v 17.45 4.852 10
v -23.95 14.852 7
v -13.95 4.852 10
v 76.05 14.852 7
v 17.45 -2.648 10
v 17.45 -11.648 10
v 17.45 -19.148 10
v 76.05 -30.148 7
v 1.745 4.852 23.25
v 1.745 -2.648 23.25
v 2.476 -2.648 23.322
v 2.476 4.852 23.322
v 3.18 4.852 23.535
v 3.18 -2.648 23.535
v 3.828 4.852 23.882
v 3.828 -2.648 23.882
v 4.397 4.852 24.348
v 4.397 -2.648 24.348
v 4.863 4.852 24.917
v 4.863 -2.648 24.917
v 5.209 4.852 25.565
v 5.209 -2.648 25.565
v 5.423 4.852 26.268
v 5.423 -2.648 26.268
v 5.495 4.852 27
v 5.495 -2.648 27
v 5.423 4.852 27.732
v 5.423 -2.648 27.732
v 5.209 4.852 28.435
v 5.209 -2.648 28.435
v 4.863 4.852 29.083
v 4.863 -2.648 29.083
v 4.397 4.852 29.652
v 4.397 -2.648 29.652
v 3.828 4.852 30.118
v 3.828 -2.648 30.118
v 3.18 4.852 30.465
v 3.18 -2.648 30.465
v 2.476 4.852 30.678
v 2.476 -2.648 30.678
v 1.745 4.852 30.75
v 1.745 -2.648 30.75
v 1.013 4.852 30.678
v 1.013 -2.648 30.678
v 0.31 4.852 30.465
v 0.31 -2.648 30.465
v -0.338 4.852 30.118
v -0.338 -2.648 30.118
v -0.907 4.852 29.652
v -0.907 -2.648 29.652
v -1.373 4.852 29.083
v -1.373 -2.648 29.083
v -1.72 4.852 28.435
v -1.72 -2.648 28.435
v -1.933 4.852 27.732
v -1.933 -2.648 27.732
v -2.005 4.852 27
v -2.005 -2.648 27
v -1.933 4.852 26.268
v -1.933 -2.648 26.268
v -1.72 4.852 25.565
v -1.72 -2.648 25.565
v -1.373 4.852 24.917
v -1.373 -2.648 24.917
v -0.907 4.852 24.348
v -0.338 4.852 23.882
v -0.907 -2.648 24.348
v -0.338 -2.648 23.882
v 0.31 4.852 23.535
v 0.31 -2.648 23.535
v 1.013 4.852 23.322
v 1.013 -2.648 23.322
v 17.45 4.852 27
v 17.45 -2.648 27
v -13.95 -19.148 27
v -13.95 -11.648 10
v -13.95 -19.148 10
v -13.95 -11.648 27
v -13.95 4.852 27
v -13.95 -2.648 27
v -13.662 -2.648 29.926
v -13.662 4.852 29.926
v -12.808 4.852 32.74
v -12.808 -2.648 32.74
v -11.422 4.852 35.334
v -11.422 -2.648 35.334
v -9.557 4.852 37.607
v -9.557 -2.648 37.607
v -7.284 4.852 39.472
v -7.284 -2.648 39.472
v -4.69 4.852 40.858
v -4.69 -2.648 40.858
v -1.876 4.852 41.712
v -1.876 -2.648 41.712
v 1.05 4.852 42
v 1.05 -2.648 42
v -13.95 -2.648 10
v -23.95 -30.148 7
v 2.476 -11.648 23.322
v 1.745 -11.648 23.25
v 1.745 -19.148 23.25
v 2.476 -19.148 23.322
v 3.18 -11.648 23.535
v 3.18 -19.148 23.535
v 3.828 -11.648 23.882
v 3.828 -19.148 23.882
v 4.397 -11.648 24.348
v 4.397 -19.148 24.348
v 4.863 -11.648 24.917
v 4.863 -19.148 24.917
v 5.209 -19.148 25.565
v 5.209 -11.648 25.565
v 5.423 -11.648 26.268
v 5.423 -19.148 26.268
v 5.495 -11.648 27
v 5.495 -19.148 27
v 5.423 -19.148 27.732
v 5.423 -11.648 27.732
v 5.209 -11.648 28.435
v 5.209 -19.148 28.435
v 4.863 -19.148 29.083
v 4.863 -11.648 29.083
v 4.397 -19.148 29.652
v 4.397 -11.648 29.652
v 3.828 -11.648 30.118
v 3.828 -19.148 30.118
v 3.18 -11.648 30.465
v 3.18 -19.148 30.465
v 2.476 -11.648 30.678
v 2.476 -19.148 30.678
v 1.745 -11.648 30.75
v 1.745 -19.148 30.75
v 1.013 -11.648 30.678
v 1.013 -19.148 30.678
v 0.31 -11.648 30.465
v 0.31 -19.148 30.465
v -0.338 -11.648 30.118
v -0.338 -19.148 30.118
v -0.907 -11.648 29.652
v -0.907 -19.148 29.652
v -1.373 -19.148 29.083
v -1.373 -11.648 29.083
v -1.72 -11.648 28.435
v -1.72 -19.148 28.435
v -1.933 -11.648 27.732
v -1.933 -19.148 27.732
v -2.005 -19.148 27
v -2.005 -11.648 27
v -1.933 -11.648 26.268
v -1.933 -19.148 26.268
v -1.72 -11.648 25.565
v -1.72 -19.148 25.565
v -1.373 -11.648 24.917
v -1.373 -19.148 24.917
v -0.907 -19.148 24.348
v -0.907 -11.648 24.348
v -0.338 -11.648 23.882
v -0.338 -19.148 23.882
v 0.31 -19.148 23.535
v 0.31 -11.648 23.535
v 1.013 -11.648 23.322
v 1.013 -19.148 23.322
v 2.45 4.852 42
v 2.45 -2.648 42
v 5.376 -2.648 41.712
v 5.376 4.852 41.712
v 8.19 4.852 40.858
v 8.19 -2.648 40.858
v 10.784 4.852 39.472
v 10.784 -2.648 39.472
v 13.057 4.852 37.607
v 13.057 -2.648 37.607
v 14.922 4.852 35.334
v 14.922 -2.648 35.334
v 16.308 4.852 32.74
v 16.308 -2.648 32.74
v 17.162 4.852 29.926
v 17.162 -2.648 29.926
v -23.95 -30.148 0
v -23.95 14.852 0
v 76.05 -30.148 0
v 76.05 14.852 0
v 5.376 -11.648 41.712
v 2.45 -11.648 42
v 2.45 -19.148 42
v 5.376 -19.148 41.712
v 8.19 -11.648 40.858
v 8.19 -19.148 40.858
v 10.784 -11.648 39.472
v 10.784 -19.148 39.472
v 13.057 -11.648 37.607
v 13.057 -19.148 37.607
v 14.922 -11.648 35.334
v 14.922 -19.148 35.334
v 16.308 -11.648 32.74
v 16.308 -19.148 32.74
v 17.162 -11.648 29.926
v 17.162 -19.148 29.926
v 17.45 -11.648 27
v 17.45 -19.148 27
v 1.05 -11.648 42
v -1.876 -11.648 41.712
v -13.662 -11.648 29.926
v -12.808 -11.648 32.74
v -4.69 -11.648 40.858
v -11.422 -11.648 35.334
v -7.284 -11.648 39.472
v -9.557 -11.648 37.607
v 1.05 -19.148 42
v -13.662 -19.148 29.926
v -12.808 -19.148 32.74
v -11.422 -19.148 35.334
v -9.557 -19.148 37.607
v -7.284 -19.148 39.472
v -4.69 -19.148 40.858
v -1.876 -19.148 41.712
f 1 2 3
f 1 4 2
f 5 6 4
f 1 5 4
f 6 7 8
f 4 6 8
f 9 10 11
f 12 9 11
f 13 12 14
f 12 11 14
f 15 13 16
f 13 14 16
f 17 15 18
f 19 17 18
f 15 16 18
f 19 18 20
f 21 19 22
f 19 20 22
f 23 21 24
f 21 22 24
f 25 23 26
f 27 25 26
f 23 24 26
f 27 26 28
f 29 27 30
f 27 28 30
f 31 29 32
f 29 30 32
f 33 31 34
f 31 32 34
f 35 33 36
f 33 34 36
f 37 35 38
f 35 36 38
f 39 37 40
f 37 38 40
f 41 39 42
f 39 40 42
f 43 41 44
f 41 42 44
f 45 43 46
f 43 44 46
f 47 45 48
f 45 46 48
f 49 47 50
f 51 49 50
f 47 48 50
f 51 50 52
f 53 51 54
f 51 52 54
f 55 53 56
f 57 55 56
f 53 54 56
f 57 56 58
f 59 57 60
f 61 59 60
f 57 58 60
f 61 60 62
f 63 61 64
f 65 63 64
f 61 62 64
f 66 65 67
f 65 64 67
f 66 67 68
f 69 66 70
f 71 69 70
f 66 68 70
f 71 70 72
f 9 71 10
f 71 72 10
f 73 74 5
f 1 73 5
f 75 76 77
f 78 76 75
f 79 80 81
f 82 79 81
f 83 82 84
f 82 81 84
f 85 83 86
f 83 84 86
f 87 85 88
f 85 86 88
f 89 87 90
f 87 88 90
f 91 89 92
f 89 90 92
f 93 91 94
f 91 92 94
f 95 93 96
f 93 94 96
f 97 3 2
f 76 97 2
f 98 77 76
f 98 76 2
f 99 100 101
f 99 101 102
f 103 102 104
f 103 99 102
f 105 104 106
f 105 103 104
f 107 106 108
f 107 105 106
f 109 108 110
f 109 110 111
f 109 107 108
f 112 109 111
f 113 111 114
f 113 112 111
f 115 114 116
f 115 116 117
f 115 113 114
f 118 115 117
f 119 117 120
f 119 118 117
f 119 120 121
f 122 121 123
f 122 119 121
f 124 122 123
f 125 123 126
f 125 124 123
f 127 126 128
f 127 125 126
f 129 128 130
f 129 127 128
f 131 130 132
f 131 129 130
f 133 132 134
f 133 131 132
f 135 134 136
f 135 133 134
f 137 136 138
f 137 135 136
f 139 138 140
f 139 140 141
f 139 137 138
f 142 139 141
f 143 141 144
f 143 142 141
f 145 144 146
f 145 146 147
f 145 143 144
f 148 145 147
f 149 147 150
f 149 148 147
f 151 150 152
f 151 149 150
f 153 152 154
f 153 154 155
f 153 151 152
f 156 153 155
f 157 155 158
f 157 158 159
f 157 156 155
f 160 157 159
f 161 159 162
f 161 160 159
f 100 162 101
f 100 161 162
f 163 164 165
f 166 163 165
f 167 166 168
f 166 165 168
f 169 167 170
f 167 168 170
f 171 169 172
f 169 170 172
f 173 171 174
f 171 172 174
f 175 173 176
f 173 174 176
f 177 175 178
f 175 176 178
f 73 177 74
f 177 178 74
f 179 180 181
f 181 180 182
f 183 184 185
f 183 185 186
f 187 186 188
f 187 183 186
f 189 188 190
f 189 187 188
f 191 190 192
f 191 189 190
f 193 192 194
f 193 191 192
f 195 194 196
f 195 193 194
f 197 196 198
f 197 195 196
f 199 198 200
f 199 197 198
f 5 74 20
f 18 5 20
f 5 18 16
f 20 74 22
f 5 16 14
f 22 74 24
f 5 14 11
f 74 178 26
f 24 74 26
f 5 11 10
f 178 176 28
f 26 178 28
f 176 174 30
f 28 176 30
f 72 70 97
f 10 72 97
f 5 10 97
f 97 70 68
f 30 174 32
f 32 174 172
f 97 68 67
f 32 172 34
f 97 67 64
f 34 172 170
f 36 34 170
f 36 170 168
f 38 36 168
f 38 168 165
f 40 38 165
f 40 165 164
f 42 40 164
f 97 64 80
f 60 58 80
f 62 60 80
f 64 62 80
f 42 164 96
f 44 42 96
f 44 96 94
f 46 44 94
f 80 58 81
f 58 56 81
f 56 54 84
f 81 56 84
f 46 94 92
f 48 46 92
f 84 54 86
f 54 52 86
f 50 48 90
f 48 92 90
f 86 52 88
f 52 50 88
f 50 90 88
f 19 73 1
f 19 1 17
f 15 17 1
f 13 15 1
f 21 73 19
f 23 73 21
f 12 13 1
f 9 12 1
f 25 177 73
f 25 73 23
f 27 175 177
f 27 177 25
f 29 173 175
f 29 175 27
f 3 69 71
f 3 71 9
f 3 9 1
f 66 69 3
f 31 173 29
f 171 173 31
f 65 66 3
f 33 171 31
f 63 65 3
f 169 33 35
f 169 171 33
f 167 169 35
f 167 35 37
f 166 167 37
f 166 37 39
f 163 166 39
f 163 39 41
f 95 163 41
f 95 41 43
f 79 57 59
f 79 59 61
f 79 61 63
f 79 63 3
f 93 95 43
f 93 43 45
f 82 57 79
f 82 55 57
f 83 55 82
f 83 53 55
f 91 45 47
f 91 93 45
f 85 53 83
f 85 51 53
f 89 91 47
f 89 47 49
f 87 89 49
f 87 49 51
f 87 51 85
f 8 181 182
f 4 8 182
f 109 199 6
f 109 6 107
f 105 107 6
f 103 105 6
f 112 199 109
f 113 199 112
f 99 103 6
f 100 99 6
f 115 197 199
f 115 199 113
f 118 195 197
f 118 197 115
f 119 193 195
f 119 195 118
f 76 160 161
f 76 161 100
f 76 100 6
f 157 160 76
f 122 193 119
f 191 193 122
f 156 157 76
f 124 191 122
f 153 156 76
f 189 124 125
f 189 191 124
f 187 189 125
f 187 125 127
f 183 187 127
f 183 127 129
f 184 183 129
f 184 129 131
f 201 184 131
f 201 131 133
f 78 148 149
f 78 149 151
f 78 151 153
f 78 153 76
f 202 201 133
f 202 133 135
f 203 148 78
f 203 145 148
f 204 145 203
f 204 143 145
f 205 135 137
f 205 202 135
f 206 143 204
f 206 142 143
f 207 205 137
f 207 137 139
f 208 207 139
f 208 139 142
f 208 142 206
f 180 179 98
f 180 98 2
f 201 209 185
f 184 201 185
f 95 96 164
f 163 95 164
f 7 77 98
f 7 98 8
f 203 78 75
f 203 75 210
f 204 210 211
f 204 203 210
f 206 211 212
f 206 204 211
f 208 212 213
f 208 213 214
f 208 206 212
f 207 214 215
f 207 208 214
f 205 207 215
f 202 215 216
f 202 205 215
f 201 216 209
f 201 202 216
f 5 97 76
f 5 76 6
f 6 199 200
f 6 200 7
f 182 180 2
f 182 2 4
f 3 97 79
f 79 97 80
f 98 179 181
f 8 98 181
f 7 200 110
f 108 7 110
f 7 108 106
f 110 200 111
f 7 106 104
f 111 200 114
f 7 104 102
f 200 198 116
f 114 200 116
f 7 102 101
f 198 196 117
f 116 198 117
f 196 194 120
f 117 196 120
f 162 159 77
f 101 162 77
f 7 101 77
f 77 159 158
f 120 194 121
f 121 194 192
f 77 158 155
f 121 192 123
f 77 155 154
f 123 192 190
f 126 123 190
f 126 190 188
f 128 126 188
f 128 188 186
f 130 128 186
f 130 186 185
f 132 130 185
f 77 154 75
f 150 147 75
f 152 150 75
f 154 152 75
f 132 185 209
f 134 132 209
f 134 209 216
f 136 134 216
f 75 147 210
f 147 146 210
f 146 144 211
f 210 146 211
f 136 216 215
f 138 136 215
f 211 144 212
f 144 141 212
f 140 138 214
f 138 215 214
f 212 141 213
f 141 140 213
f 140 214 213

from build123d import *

# Parameters (mm, degrees)
SKETCH1_W           = 100
SKETCH1_H           = 45
BOSS_EXTRUDE1_DEPTH = 10
SKETCH3_W           = 31.4
SKETCH3_H           = 7.5
BOSS_EXTRUDE2_DEPTH = 5
SKETCH4_R           = 3.75
BOSS_EXTRUDE3_DEPTH = 7.5
CUT_EXTRUDE1_DEPTH  = 45
CUT_EXTRUDE2_DEPTH  = 100


with BuildPart() as part:
    # Sketch1 → Boss-Extrude1 (new body)
    with BuildSketch(Plane.XY):
        with Locations((26.050004349, -7.647768163)):
            Rectangle(SKETCH1_W, SKETCH1_H)
    extrude(amount=BOSS_EXTRUDE1_DEPTH)

    # Sketch3 → Boss-Extrude2 (add)
    with BuildSketch(Plane.XY.offset(10)):
        with Locations((1.750004349, 1.102231837)):
            Rectangle(SKETCH3_W, SKETCH3_H)
    boss_extrude2 = extrude(amount=BOSS_EXTRUDE2_DEPTH)

    # Sketch4 → Boss-Extrude3 (add)
    with BuildSketch(Plane.XZ.offset(2.647768163)):
        with BuildLine():
            Line((-13.949995651, 15), (-13.949995651, 27))
            ThreePointArc((-13.949995651, 27), (-9.556597369, 37.606601718), (1.050004349, 42))
            Line((1.050004349, 42), (2.450004349, 42))
            ThreePointArc((2.450004349, 42), (13.056606067, 37.606601718), (17.450004349, 27))
            Line((17.450004349, 27), (17.450004349, 15))
            Line((17.450004349, 15), (-13.949995651, 15))
        make_face()
        with Locations(Location((1.744890168, 27, 0), (0, 0, 270))):
            Circle(SKETCH4_R, mode=Mode.SUBTRACT)
    boss_extrude3 = extrude(amount=-BOSS_EXTRUDE3_DEPTH)

    # Mirror1: Boss-Extrude2, Boss-Extrude3 across plane
    add(boss_extrude2.mirror(Plane(origin=(0, -7.147768163, 0), x_dir=(0, 0, 1), z_dir=(0, -1, 0))))
    add(boss_extrude3.mirror(Plane(origin=(0, -7.147768163, 0), x_dir=(0, 0, 1), z_dir=(0, -1, 0))))

    # Sketch5 → Cut-Extrude1 (cut)
    with BuildSketch(Plane.XZ.offset(30.147768163)):
        Polygon((-13.949995651, 10), (-23.949995651, 7), (-23.949995651, 10), align=None)
        Polygon((17.450004349, 10), (76.050004349, 7), (76.050004349, 10), align=None)
    extrude(amount=-CUT_EXTRUDE1_DEPTH, mode=Mode.SUBTRACT)

    # Sketch6 → Cut-Extrude2 (cut)
    with BuildSketch(Plane.ZY.offset(23.949995651)):
        Polygon((7, 14.852231837), (10, 4.852231837), (10, 14.852231837), align=None)
        Polygon((10, -19.147768163), (7, -30.147768163), (10, -30.147768163), align=None)
    extrude(amount=-CUT_EXTRUDE2_DEPTH, mode=Mode.SUBTRACT)


solid = part.part
